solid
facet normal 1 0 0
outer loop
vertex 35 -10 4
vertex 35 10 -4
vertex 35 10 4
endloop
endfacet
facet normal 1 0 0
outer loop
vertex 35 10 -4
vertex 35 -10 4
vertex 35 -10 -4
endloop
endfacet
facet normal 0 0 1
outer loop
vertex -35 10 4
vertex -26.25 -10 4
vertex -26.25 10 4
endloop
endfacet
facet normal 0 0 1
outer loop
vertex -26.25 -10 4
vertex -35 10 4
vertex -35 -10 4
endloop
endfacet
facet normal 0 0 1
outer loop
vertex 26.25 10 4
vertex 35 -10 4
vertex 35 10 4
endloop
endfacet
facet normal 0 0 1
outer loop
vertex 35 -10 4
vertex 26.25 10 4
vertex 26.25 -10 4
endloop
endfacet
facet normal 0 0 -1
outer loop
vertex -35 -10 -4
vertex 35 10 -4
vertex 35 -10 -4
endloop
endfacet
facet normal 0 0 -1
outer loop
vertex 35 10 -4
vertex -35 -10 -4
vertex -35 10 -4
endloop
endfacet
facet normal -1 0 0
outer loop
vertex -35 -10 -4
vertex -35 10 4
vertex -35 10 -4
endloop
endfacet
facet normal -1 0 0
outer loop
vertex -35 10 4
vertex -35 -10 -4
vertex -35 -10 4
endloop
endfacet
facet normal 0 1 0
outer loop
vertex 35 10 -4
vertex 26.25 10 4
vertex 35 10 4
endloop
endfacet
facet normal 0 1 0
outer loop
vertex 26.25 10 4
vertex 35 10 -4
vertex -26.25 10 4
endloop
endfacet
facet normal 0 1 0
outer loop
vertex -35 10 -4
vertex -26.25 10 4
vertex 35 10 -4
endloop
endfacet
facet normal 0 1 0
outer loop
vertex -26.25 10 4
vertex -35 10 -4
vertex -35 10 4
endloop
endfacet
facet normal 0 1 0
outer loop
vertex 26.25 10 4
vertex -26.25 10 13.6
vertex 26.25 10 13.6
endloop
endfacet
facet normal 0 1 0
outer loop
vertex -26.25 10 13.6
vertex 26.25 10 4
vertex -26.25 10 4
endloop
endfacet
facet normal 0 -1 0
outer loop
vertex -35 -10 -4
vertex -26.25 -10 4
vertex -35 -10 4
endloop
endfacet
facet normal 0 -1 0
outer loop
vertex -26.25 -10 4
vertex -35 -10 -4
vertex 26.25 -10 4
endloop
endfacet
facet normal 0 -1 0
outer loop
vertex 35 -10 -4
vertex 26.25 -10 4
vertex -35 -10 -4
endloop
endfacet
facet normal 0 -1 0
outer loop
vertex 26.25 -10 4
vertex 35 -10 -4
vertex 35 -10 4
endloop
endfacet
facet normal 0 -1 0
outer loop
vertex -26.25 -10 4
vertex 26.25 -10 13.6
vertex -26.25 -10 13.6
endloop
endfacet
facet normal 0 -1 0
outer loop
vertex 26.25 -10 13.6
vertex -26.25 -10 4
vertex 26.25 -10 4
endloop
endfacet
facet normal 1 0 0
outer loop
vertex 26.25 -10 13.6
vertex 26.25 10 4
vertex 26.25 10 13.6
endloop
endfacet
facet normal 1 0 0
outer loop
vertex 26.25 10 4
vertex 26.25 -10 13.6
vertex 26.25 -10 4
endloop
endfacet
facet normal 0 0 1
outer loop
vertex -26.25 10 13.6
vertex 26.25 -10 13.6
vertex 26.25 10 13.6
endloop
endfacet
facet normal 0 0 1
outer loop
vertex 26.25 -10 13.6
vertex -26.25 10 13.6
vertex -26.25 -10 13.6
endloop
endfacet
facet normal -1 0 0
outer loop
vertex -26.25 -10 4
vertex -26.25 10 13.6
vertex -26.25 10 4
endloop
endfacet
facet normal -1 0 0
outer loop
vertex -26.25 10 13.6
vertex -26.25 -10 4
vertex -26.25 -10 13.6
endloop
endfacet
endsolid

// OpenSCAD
wheel_track = 15;

module body(base_length = 70, base_height = 8, width = 20)
{
	top_length = 0.75 * base_length;
	top_height = 1.2 * base_height;
	
	// base
	cube([base_length, width, base_height], center = true);
	
	// top
	translate([0, 0, base_height/2 + top_height/2])
		cube([top_length, width, top_height], center = true);
}

module axles()
{
	
};

body();
